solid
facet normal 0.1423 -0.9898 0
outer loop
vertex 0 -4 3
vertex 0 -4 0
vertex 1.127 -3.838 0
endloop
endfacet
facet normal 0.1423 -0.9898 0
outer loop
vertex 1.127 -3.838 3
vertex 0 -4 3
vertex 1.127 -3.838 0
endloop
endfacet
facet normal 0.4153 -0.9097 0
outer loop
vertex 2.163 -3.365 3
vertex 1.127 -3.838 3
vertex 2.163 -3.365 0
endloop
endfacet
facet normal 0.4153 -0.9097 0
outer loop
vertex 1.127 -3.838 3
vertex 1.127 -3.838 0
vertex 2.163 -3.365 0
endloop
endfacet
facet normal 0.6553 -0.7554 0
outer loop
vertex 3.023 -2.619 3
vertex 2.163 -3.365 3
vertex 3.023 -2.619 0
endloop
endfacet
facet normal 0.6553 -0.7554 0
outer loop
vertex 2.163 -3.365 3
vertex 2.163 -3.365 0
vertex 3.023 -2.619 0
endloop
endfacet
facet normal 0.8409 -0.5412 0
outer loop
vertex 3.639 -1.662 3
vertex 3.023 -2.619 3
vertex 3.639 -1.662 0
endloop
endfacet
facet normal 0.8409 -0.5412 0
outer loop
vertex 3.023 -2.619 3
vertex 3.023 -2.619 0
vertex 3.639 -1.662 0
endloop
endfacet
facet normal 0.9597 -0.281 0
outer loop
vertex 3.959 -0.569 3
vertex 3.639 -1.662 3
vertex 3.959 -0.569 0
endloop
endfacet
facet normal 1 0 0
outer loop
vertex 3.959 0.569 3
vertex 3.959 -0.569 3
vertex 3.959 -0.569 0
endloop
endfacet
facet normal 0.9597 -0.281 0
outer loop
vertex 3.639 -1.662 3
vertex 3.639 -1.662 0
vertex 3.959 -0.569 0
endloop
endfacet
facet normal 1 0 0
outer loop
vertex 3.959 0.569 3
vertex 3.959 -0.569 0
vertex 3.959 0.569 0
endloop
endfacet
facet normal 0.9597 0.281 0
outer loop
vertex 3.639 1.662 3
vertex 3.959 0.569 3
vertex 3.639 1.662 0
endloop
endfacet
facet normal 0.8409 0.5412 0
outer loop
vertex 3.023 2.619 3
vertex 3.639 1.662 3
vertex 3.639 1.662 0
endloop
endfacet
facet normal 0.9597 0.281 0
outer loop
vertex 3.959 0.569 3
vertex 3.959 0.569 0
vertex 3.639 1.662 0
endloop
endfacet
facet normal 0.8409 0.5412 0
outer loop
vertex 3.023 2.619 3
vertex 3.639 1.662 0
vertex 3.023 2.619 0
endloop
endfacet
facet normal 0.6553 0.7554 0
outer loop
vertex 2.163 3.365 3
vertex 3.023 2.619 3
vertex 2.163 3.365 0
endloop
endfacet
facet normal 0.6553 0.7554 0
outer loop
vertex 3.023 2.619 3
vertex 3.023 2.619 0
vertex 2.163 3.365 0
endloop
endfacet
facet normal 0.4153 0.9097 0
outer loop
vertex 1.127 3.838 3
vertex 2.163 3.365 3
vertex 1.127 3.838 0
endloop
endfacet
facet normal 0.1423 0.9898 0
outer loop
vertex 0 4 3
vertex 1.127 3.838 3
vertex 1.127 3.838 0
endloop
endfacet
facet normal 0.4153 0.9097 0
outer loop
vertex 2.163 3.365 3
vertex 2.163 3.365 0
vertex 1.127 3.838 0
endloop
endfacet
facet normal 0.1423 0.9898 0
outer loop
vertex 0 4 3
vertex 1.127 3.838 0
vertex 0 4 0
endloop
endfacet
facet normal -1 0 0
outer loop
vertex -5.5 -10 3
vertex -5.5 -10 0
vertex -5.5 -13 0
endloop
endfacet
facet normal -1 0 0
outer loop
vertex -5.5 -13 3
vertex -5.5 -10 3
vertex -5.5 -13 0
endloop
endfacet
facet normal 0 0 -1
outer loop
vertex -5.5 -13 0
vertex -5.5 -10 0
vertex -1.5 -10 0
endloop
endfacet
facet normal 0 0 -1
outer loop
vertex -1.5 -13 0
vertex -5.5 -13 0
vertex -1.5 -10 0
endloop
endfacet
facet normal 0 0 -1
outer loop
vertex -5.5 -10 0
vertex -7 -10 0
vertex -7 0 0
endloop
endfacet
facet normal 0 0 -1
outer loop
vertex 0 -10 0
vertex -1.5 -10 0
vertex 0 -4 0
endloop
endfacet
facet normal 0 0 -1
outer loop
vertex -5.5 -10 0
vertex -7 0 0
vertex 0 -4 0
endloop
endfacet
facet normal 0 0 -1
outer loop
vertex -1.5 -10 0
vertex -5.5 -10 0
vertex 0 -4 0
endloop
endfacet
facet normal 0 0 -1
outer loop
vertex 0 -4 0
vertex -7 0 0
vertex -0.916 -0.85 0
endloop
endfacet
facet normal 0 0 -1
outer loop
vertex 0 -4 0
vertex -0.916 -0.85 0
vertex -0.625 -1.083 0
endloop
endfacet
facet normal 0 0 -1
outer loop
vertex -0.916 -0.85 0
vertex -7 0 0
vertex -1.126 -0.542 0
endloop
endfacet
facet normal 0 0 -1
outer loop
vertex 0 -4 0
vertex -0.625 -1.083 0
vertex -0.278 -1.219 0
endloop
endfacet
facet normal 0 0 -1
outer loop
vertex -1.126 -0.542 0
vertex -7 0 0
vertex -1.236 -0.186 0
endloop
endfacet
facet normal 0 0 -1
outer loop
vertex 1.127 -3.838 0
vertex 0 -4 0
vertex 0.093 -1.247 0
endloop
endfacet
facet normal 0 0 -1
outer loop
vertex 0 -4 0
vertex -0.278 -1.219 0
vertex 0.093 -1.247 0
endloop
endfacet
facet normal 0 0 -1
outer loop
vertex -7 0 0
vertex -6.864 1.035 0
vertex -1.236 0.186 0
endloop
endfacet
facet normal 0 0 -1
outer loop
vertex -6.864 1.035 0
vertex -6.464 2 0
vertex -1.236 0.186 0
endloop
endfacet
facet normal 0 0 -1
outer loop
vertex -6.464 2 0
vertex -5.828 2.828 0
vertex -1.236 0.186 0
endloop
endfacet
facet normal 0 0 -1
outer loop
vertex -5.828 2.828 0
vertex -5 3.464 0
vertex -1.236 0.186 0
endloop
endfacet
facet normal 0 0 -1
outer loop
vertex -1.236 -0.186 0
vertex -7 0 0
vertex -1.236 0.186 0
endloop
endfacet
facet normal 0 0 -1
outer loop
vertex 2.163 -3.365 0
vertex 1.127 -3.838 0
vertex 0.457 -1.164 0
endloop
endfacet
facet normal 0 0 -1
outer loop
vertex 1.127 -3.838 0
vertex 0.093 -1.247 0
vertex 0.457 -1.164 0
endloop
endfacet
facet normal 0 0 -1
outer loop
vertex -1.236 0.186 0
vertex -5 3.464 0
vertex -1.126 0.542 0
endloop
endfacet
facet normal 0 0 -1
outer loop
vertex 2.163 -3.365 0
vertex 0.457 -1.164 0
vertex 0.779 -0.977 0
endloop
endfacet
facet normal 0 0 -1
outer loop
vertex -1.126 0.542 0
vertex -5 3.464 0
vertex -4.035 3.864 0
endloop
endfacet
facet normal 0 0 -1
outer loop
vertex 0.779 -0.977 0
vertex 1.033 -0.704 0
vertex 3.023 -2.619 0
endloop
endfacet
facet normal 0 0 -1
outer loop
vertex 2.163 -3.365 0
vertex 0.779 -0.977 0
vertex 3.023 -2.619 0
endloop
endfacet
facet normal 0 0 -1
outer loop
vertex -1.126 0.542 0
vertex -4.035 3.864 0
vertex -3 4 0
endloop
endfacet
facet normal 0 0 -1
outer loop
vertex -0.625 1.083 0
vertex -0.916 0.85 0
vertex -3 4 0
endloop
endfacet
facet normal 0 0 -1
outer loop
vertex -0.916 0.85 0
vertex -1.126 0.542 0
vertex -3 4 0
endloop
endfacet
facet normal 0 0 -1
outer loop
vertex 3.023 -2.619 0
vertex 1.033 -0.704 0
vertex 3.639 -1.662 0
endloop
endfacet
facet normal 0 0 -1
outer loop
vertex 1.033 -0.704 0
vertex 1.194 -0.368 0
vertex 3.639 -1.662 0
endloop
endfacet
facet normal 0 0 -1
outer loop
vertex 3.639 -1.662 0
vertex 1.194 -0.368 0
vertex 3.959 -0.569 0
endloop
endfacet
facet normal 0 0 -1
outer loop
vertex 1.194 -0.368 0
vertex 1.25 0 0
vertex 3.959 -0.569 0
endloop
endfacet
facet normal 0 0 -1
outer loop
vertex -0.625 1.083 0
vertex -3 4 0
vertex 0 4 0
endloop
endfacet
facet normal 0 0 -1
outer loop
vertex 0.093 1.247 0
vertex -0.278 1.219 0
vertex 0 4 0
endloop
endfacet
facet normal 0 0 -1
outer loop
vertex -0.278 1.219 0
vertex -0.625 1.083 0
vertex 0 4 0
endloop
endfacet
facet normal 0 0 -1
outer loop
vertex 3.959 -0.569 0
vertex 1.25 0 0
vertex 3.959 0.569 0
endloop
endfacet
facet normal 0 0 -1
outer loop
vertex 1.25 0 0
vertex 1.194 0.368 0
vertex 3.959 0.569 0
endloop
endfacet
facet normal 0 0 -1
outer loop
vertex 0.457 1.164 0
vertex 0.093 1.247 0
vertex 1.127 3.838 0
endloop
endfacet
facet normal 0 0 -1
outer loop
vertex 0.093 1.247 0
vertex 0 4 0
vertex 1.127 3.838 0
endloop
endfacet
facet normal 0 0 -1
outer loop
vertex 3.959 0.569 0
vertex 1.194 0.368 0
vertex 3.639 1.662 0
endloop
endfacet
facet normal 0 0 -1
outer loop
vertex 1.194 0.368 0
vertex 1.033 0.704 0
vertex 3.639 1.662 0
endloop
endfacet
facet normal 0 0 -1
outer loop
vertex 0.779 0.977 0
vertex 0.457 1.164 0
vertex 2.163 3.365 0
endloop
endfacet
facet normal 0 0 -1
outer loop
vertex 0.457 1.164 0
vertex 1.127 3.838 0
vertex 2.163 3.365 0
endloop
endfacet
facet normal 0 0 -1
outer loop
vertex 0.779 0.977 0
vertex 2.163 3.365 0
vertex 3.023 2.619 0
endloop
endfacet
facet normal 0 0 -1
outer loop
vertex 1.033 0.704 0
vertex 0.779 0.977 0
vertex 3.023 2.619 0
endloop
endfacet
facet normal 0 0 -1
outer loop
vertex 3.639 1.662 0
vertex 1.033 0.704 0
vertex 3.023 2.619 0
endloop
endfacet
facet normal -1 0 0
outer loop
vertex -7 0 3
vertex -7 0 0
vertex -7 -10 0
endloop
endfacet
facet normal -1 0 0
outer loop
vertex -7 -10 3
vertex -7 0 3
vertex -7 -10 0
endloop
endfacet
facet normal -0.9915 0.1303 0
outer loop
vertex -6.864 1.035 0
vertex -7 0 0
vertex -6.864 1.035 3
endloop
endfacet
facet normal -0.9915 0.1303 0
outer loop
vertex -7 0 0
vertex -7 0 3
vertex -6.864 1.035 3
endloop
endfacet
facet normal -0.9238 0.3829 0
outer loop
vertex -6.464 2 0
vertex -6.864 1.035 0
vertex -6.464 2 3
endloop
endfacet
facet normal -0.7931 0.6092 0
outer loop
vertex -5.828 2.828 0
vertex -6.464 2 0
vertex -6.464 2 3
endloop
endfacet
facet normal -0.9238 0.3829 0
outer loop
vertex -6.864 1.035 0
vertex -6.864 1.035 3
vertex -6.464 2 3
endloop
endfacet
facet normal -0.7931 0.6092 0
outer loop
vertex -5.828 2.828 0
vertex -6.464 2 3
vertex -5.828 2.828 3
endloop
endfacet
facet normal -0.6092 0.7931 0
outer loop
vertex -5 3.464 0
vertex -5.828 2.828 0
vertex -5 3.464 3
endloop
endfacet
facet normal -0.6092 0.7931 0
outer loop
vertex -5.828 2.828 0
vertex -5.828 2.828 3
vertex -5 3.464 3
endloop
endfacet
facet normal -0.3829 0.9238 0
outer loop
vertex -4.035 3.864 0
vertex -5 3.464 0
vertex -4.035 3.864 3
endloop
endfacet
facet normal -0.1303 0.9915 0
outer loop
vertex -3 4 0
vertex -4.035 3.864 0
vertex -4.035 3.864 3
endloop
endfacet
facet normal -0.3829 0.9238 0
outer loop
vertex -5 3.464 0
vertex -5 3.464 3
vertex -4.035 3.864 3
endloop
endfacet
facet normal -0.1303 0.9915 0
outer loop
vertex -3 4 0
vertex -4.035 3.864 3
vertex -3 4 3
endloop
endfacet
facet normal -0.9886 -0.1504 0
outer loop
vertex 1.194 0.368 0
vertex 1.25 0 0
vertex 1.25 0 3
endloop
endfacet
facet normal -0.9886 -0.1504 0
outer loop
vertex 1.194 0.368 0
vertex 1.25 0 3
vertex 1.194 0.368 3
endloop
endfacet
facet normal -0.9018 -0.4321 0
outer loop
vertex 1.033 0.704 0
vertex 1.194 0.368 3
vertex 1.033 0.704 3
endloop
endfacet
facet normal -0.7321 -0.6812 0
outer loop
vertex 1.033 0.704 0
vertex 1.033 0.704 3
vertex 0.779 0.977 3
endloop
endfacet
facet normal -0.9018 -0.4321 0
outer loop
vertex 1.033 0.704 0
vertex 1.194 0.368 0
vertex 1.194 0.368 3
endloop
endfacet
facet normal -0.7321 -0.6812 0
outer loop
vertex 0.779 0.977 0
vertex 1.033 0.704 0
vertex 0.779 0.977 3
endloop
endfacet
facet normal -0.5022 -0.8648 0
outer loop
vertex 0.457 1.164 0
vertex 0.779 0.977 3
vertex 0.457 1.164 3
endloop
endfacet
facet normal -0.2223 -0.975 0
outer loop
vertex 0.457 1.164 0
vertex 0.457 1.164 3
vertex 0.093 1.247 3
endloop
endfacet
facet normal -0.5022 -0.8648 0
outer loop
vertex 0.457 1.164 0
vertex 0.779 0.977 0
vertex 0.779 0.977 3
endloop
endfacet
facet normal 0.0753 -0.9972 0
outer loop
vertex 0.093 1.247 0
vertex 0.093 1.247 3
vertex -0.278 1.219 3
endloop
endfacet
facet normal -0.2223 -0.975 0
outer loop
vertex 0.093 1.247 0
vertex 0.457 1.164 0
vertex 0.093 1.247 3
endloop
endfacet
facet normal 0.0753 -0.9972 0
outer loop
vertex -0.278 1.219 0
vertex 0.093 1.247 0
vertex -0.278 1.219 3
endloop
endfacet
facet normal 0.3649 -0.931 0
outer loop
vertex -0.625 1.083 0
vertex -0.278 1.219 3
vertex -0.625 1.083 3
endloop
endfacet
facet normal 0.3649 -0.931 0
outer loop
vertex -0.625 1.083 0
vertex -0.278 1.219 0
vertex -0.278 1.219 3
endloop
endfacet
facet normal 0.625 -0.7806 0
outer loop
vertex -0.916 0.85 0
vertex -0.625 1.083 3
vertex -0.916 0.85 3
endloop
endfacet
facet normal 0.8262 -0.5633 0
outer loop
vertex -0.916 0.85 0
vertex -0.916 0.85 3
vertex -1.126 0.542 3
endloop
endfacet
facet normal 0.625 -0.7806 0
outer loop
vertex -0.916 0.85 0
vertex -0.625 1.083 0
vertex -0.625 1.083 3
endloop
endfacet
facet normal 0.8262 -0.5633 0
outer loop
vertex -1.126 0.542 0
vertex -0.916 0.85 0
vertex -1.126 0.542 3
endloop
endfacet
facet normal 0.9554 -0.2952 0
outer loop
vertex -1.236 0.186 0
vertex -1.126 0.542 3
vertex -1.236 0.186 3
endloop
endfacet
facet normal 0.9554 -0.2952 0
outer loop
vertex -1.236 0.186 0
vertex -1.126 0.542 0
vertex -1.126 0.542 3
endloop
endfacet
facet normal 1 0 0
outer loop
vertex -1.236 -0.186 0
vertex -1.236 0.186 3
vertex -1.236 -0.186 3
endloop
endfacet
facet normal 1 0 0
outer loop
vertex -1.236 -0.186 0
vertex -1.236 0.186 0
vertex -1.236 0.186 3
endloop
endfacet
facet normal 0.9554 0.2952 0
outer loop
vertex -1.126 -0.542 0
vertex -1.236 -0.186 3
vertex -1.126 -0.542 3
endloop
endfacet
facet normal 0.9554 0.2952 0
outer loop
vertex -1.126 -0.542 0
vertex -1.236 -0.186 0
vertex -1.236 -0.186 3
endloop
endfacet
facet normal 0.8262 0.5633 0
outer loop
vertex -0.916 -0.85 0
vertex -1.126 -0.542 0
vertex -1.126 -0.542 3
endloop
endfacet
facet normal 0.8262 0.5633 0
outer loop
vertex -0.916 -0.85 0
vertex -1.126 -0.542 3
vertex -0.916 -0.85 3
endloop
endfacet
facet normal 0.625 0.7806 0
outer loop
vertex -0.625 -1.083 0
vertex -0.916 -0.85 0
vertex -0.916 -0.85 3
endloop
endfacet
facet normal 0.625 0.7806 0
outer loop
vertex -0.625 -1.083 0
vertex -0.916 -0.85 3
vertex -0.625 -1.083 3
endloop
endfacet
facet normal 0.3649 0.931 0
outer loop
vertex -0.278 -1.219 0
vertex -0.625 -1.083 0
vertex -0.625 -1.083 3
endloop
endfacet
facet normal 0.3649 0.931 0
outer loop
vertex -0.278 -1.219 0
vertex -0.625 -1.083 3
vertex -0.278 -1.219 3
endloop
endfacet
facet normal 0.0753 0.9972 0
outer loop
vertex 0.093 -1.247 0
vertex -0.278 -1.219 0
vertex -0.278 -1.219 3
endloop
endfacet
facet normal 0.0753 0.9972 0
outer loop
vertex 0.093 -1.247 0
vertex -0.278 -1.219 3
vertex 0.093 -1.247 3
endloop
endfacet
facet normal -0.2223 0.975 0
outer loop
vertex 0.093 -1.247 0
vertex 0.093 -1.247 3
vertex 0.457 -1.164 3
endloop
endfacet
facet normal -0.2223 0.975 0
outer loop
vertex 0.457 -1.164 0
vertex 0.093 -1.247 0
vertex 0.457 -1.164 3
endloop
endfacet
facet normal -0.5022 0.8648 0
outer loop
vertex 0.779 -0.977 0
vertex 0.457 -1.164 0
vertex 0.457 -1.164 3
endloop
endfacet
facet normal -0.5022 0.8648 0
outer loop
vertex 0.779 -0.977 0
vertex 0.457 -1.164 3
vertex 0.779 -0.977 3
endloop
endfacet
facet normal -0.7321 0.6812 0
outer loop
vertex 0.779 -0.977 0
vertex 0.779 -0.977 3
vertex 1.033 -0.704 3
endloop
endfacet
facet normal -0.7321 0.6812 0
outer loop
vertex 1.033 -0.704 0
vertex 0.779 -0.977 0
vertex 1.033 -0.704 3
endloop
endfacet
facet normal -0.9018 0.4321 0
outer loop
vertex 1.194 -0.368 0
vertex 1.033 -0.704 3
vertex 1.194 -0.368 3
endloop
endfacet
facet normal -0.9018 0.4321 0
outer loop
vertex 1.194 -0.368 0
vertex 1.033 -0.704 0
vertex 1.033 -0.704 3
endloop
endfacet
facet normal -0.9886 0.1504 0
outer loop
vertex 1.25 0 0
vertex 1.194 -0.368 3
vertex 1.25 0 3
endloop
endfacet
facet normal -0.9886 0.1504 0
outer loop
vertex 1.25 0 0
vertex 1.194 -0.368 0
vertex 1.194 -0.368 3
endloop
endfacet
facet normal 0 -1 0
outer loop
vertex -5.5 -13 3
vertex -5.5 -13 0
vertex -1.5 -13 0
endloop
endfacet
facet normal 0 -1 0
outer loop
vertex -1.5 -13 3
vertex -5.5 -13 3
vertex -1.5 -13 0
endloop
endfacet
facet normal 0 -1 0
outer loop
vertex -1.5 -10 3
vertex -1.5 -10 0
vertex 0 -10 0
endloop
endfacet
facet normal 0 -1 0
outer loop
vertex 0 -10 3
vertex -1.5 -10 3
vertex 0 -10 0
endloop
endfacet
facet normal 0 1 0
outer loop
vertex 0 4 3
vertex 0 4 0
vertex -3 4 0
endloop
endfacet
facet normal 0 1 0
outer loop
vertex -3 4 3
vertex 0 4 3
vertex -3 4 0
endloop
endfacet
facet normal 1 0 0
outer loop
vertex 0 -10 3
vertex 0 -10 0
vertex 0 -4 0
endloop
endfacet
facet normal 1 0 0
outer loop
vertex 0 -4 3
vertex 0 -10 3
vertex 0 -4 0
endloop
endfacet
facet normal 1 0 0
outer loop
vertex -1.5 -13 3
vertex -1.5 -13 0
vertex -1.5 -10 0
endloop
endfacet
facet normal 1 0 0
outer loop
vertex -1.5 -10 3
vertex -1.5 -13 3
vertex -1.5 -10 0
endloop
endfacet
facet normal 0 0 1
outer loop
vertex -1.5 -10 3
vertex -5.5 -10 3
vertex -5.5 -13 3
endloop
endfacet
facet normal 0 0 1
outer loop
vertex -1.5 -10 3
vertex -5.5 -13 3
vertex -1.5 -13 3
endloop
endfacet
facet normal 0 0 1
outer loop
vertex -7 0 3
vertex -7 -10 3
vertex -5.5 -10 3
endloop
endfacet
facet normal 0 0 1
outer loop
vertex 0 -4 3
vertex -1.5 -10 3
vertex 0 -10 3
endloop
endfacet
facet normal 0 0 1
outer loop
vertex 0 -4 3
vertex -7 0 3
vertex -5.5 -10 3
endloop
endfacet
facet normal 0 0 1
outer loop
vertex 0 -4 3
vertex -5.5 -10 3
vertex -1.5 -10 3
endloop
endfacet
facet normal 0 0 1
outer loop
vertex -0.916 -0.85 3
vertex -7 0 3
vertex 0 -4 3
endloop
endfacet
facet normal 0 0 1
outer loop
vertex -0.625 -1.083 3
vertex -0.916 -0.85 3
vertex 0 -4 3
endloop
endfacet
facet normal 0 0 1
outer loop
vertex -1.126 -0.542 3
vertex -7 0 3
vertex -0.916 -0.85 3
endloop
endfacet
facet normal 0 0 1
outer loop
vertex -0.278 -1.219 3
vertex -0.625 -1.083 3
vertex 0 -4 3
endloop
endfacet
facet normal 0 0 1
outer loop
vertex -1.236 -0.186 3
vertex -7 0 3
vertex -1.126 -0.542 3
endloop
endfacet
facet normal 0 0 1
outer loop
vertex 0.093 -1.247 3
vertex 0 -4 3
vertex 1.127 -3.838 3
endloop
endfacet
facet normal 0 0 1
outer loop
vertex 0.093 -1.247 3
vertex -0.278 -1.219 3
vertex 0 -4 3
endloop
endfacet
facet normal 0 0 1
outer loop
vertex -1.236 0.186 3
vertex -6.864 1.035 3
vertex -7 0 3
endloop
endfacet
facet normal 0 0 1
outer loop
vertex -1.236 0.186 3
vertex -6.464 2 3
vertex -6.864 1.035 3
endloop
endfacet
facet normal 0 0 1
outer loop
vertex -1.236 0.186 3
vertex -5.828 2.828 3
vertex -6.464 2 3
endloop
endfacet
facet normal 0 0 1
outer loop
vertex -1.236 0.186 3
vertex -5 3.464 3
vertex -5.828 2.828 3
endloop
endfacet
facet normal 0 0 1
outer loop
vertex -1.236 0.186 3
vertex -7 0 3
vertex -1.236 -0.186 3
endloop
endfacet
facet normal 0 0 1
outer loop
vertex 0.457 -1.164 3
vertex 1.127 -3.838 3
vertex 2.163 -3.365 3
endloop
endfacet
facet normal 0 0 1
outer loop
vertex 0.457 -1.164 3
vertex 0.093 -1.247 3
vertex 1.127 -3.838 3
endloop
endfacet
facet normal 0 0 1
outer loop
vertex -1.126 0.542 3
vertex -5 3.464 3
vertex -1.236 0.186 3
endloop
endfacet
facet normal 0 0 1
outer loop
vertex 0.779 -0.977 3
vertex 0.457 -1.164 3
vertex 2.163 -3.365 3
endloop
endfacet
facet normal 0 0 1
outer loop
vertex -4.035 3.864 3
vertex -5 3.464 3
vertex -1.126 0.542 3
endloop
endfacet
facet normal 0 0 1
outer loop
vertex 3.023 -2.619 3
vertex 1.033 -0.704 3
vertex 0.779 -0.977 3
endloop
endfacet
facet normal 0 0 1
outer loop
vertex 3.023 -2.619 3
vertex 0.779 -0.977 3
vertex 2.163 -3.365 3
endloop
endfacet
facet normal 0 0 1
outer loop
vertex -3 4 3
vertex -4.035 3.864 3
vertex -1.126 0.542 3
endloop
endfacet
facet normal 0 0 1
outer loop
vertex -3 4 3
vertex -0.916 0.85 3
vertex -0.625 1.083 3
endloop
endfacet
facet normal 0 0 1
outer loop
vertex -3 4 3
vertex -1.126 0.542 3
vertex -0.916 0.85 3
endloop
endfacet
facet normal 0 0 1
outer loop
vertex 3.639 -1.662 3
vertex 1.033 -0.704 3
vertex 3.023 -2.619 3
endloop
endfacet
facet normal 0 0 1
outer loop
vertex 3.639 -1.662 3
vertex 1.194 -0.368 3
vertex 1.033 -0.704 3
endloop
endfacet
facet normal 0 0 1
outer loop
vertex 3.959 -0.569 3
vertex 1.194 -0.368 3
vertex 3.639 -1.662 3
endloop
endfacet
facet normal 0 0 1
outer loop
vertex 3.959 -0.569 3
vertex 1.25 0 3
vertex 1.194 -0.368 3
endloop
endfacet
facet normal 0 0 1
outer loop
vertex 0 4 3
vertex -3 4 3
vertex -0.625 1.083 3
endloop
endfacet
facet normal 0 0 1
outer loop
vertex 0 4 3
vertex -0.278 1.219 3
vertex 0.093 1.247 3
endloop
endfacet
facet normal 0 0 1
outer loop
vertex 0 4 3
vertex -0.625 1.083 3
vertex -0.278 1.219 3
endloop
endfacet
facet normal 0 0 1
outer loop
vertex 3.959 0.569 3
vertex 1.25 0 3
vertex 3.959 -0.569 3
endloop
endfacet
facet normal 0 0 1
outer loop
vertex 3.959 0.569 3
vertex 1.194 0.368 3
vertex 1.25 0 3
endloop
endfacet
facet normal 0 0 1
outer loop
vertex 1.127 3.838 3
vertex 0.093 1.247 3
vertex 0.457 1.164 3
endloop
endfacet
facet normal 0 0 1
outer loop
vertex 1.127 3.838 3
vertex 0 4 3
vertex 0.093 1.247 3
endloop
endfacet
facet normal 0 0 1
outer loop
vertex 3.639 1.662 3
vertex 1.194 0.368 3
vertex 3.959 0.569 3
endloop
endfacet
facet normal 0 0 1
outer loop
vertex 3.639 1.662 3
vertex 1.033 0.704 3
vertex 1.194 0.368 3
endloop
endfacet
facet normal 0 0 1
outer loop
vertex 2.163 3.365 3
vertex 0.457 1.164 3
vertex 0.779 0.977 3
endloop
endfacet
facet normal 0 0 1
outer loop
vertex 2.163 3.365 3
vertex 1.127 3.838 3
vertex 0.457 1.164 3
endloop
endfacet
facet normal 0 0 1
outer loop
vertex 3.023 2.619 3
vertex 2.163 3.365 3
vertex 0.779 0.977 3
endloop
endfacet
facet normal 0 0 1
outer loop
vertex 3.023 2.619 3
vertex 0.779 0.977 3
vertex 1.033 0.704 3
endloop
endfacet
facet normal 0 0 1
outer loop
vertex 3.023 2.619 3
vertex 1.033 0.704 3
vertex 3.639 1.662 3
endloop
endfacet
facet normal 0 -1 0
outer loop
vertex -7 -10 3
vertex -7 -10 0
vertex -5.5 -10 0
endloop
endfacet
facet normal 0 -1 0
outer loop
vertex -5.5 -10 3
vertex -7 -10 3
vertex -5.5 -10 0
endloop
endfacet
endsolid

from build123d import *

# Parameters (mm, degrees)
SKETCH1_R           = 1.25
BOSS_EXTRUDE1_DEPTH = 3
FILLET1_R           = 4


with BuildPart() as part:
    # Sketch1 → Boss-Extrude1 (new body)
    with BuildSketch(Plane.XY):
        with BuildLine():
            Line((-7, 4), (-7, -10))
            Line((-7, -10), (-5.5, -10))
            Line((-5.5, -10), (-5.5, -13))
            Line((-5.5, -13), (-1.5, -13))
            Line((-1.5, -13), (-1.5, -10))
            Line((-1.5, -10), (0, -10))
            Line((0, -10), (0, -4))
            ThreePointArc((0, -4), (4, 0), (0, 4))
            Line((0, 4), (-7, 4))
        make_face()
        Circle(SKETCH1_R, mode=Mode.SUBTRACT)
    extrude(amount=BOSS_EXTRUDE1_DEPTH)

    # Fillet1
    fillet1_edges = [part.edges().sort_by_distance(p)[0] for p in [
        (-7, 4, 1.5),
    ]]
    fillet(fillet1_edges, radius=FILLET1_R)


solid = part.part
